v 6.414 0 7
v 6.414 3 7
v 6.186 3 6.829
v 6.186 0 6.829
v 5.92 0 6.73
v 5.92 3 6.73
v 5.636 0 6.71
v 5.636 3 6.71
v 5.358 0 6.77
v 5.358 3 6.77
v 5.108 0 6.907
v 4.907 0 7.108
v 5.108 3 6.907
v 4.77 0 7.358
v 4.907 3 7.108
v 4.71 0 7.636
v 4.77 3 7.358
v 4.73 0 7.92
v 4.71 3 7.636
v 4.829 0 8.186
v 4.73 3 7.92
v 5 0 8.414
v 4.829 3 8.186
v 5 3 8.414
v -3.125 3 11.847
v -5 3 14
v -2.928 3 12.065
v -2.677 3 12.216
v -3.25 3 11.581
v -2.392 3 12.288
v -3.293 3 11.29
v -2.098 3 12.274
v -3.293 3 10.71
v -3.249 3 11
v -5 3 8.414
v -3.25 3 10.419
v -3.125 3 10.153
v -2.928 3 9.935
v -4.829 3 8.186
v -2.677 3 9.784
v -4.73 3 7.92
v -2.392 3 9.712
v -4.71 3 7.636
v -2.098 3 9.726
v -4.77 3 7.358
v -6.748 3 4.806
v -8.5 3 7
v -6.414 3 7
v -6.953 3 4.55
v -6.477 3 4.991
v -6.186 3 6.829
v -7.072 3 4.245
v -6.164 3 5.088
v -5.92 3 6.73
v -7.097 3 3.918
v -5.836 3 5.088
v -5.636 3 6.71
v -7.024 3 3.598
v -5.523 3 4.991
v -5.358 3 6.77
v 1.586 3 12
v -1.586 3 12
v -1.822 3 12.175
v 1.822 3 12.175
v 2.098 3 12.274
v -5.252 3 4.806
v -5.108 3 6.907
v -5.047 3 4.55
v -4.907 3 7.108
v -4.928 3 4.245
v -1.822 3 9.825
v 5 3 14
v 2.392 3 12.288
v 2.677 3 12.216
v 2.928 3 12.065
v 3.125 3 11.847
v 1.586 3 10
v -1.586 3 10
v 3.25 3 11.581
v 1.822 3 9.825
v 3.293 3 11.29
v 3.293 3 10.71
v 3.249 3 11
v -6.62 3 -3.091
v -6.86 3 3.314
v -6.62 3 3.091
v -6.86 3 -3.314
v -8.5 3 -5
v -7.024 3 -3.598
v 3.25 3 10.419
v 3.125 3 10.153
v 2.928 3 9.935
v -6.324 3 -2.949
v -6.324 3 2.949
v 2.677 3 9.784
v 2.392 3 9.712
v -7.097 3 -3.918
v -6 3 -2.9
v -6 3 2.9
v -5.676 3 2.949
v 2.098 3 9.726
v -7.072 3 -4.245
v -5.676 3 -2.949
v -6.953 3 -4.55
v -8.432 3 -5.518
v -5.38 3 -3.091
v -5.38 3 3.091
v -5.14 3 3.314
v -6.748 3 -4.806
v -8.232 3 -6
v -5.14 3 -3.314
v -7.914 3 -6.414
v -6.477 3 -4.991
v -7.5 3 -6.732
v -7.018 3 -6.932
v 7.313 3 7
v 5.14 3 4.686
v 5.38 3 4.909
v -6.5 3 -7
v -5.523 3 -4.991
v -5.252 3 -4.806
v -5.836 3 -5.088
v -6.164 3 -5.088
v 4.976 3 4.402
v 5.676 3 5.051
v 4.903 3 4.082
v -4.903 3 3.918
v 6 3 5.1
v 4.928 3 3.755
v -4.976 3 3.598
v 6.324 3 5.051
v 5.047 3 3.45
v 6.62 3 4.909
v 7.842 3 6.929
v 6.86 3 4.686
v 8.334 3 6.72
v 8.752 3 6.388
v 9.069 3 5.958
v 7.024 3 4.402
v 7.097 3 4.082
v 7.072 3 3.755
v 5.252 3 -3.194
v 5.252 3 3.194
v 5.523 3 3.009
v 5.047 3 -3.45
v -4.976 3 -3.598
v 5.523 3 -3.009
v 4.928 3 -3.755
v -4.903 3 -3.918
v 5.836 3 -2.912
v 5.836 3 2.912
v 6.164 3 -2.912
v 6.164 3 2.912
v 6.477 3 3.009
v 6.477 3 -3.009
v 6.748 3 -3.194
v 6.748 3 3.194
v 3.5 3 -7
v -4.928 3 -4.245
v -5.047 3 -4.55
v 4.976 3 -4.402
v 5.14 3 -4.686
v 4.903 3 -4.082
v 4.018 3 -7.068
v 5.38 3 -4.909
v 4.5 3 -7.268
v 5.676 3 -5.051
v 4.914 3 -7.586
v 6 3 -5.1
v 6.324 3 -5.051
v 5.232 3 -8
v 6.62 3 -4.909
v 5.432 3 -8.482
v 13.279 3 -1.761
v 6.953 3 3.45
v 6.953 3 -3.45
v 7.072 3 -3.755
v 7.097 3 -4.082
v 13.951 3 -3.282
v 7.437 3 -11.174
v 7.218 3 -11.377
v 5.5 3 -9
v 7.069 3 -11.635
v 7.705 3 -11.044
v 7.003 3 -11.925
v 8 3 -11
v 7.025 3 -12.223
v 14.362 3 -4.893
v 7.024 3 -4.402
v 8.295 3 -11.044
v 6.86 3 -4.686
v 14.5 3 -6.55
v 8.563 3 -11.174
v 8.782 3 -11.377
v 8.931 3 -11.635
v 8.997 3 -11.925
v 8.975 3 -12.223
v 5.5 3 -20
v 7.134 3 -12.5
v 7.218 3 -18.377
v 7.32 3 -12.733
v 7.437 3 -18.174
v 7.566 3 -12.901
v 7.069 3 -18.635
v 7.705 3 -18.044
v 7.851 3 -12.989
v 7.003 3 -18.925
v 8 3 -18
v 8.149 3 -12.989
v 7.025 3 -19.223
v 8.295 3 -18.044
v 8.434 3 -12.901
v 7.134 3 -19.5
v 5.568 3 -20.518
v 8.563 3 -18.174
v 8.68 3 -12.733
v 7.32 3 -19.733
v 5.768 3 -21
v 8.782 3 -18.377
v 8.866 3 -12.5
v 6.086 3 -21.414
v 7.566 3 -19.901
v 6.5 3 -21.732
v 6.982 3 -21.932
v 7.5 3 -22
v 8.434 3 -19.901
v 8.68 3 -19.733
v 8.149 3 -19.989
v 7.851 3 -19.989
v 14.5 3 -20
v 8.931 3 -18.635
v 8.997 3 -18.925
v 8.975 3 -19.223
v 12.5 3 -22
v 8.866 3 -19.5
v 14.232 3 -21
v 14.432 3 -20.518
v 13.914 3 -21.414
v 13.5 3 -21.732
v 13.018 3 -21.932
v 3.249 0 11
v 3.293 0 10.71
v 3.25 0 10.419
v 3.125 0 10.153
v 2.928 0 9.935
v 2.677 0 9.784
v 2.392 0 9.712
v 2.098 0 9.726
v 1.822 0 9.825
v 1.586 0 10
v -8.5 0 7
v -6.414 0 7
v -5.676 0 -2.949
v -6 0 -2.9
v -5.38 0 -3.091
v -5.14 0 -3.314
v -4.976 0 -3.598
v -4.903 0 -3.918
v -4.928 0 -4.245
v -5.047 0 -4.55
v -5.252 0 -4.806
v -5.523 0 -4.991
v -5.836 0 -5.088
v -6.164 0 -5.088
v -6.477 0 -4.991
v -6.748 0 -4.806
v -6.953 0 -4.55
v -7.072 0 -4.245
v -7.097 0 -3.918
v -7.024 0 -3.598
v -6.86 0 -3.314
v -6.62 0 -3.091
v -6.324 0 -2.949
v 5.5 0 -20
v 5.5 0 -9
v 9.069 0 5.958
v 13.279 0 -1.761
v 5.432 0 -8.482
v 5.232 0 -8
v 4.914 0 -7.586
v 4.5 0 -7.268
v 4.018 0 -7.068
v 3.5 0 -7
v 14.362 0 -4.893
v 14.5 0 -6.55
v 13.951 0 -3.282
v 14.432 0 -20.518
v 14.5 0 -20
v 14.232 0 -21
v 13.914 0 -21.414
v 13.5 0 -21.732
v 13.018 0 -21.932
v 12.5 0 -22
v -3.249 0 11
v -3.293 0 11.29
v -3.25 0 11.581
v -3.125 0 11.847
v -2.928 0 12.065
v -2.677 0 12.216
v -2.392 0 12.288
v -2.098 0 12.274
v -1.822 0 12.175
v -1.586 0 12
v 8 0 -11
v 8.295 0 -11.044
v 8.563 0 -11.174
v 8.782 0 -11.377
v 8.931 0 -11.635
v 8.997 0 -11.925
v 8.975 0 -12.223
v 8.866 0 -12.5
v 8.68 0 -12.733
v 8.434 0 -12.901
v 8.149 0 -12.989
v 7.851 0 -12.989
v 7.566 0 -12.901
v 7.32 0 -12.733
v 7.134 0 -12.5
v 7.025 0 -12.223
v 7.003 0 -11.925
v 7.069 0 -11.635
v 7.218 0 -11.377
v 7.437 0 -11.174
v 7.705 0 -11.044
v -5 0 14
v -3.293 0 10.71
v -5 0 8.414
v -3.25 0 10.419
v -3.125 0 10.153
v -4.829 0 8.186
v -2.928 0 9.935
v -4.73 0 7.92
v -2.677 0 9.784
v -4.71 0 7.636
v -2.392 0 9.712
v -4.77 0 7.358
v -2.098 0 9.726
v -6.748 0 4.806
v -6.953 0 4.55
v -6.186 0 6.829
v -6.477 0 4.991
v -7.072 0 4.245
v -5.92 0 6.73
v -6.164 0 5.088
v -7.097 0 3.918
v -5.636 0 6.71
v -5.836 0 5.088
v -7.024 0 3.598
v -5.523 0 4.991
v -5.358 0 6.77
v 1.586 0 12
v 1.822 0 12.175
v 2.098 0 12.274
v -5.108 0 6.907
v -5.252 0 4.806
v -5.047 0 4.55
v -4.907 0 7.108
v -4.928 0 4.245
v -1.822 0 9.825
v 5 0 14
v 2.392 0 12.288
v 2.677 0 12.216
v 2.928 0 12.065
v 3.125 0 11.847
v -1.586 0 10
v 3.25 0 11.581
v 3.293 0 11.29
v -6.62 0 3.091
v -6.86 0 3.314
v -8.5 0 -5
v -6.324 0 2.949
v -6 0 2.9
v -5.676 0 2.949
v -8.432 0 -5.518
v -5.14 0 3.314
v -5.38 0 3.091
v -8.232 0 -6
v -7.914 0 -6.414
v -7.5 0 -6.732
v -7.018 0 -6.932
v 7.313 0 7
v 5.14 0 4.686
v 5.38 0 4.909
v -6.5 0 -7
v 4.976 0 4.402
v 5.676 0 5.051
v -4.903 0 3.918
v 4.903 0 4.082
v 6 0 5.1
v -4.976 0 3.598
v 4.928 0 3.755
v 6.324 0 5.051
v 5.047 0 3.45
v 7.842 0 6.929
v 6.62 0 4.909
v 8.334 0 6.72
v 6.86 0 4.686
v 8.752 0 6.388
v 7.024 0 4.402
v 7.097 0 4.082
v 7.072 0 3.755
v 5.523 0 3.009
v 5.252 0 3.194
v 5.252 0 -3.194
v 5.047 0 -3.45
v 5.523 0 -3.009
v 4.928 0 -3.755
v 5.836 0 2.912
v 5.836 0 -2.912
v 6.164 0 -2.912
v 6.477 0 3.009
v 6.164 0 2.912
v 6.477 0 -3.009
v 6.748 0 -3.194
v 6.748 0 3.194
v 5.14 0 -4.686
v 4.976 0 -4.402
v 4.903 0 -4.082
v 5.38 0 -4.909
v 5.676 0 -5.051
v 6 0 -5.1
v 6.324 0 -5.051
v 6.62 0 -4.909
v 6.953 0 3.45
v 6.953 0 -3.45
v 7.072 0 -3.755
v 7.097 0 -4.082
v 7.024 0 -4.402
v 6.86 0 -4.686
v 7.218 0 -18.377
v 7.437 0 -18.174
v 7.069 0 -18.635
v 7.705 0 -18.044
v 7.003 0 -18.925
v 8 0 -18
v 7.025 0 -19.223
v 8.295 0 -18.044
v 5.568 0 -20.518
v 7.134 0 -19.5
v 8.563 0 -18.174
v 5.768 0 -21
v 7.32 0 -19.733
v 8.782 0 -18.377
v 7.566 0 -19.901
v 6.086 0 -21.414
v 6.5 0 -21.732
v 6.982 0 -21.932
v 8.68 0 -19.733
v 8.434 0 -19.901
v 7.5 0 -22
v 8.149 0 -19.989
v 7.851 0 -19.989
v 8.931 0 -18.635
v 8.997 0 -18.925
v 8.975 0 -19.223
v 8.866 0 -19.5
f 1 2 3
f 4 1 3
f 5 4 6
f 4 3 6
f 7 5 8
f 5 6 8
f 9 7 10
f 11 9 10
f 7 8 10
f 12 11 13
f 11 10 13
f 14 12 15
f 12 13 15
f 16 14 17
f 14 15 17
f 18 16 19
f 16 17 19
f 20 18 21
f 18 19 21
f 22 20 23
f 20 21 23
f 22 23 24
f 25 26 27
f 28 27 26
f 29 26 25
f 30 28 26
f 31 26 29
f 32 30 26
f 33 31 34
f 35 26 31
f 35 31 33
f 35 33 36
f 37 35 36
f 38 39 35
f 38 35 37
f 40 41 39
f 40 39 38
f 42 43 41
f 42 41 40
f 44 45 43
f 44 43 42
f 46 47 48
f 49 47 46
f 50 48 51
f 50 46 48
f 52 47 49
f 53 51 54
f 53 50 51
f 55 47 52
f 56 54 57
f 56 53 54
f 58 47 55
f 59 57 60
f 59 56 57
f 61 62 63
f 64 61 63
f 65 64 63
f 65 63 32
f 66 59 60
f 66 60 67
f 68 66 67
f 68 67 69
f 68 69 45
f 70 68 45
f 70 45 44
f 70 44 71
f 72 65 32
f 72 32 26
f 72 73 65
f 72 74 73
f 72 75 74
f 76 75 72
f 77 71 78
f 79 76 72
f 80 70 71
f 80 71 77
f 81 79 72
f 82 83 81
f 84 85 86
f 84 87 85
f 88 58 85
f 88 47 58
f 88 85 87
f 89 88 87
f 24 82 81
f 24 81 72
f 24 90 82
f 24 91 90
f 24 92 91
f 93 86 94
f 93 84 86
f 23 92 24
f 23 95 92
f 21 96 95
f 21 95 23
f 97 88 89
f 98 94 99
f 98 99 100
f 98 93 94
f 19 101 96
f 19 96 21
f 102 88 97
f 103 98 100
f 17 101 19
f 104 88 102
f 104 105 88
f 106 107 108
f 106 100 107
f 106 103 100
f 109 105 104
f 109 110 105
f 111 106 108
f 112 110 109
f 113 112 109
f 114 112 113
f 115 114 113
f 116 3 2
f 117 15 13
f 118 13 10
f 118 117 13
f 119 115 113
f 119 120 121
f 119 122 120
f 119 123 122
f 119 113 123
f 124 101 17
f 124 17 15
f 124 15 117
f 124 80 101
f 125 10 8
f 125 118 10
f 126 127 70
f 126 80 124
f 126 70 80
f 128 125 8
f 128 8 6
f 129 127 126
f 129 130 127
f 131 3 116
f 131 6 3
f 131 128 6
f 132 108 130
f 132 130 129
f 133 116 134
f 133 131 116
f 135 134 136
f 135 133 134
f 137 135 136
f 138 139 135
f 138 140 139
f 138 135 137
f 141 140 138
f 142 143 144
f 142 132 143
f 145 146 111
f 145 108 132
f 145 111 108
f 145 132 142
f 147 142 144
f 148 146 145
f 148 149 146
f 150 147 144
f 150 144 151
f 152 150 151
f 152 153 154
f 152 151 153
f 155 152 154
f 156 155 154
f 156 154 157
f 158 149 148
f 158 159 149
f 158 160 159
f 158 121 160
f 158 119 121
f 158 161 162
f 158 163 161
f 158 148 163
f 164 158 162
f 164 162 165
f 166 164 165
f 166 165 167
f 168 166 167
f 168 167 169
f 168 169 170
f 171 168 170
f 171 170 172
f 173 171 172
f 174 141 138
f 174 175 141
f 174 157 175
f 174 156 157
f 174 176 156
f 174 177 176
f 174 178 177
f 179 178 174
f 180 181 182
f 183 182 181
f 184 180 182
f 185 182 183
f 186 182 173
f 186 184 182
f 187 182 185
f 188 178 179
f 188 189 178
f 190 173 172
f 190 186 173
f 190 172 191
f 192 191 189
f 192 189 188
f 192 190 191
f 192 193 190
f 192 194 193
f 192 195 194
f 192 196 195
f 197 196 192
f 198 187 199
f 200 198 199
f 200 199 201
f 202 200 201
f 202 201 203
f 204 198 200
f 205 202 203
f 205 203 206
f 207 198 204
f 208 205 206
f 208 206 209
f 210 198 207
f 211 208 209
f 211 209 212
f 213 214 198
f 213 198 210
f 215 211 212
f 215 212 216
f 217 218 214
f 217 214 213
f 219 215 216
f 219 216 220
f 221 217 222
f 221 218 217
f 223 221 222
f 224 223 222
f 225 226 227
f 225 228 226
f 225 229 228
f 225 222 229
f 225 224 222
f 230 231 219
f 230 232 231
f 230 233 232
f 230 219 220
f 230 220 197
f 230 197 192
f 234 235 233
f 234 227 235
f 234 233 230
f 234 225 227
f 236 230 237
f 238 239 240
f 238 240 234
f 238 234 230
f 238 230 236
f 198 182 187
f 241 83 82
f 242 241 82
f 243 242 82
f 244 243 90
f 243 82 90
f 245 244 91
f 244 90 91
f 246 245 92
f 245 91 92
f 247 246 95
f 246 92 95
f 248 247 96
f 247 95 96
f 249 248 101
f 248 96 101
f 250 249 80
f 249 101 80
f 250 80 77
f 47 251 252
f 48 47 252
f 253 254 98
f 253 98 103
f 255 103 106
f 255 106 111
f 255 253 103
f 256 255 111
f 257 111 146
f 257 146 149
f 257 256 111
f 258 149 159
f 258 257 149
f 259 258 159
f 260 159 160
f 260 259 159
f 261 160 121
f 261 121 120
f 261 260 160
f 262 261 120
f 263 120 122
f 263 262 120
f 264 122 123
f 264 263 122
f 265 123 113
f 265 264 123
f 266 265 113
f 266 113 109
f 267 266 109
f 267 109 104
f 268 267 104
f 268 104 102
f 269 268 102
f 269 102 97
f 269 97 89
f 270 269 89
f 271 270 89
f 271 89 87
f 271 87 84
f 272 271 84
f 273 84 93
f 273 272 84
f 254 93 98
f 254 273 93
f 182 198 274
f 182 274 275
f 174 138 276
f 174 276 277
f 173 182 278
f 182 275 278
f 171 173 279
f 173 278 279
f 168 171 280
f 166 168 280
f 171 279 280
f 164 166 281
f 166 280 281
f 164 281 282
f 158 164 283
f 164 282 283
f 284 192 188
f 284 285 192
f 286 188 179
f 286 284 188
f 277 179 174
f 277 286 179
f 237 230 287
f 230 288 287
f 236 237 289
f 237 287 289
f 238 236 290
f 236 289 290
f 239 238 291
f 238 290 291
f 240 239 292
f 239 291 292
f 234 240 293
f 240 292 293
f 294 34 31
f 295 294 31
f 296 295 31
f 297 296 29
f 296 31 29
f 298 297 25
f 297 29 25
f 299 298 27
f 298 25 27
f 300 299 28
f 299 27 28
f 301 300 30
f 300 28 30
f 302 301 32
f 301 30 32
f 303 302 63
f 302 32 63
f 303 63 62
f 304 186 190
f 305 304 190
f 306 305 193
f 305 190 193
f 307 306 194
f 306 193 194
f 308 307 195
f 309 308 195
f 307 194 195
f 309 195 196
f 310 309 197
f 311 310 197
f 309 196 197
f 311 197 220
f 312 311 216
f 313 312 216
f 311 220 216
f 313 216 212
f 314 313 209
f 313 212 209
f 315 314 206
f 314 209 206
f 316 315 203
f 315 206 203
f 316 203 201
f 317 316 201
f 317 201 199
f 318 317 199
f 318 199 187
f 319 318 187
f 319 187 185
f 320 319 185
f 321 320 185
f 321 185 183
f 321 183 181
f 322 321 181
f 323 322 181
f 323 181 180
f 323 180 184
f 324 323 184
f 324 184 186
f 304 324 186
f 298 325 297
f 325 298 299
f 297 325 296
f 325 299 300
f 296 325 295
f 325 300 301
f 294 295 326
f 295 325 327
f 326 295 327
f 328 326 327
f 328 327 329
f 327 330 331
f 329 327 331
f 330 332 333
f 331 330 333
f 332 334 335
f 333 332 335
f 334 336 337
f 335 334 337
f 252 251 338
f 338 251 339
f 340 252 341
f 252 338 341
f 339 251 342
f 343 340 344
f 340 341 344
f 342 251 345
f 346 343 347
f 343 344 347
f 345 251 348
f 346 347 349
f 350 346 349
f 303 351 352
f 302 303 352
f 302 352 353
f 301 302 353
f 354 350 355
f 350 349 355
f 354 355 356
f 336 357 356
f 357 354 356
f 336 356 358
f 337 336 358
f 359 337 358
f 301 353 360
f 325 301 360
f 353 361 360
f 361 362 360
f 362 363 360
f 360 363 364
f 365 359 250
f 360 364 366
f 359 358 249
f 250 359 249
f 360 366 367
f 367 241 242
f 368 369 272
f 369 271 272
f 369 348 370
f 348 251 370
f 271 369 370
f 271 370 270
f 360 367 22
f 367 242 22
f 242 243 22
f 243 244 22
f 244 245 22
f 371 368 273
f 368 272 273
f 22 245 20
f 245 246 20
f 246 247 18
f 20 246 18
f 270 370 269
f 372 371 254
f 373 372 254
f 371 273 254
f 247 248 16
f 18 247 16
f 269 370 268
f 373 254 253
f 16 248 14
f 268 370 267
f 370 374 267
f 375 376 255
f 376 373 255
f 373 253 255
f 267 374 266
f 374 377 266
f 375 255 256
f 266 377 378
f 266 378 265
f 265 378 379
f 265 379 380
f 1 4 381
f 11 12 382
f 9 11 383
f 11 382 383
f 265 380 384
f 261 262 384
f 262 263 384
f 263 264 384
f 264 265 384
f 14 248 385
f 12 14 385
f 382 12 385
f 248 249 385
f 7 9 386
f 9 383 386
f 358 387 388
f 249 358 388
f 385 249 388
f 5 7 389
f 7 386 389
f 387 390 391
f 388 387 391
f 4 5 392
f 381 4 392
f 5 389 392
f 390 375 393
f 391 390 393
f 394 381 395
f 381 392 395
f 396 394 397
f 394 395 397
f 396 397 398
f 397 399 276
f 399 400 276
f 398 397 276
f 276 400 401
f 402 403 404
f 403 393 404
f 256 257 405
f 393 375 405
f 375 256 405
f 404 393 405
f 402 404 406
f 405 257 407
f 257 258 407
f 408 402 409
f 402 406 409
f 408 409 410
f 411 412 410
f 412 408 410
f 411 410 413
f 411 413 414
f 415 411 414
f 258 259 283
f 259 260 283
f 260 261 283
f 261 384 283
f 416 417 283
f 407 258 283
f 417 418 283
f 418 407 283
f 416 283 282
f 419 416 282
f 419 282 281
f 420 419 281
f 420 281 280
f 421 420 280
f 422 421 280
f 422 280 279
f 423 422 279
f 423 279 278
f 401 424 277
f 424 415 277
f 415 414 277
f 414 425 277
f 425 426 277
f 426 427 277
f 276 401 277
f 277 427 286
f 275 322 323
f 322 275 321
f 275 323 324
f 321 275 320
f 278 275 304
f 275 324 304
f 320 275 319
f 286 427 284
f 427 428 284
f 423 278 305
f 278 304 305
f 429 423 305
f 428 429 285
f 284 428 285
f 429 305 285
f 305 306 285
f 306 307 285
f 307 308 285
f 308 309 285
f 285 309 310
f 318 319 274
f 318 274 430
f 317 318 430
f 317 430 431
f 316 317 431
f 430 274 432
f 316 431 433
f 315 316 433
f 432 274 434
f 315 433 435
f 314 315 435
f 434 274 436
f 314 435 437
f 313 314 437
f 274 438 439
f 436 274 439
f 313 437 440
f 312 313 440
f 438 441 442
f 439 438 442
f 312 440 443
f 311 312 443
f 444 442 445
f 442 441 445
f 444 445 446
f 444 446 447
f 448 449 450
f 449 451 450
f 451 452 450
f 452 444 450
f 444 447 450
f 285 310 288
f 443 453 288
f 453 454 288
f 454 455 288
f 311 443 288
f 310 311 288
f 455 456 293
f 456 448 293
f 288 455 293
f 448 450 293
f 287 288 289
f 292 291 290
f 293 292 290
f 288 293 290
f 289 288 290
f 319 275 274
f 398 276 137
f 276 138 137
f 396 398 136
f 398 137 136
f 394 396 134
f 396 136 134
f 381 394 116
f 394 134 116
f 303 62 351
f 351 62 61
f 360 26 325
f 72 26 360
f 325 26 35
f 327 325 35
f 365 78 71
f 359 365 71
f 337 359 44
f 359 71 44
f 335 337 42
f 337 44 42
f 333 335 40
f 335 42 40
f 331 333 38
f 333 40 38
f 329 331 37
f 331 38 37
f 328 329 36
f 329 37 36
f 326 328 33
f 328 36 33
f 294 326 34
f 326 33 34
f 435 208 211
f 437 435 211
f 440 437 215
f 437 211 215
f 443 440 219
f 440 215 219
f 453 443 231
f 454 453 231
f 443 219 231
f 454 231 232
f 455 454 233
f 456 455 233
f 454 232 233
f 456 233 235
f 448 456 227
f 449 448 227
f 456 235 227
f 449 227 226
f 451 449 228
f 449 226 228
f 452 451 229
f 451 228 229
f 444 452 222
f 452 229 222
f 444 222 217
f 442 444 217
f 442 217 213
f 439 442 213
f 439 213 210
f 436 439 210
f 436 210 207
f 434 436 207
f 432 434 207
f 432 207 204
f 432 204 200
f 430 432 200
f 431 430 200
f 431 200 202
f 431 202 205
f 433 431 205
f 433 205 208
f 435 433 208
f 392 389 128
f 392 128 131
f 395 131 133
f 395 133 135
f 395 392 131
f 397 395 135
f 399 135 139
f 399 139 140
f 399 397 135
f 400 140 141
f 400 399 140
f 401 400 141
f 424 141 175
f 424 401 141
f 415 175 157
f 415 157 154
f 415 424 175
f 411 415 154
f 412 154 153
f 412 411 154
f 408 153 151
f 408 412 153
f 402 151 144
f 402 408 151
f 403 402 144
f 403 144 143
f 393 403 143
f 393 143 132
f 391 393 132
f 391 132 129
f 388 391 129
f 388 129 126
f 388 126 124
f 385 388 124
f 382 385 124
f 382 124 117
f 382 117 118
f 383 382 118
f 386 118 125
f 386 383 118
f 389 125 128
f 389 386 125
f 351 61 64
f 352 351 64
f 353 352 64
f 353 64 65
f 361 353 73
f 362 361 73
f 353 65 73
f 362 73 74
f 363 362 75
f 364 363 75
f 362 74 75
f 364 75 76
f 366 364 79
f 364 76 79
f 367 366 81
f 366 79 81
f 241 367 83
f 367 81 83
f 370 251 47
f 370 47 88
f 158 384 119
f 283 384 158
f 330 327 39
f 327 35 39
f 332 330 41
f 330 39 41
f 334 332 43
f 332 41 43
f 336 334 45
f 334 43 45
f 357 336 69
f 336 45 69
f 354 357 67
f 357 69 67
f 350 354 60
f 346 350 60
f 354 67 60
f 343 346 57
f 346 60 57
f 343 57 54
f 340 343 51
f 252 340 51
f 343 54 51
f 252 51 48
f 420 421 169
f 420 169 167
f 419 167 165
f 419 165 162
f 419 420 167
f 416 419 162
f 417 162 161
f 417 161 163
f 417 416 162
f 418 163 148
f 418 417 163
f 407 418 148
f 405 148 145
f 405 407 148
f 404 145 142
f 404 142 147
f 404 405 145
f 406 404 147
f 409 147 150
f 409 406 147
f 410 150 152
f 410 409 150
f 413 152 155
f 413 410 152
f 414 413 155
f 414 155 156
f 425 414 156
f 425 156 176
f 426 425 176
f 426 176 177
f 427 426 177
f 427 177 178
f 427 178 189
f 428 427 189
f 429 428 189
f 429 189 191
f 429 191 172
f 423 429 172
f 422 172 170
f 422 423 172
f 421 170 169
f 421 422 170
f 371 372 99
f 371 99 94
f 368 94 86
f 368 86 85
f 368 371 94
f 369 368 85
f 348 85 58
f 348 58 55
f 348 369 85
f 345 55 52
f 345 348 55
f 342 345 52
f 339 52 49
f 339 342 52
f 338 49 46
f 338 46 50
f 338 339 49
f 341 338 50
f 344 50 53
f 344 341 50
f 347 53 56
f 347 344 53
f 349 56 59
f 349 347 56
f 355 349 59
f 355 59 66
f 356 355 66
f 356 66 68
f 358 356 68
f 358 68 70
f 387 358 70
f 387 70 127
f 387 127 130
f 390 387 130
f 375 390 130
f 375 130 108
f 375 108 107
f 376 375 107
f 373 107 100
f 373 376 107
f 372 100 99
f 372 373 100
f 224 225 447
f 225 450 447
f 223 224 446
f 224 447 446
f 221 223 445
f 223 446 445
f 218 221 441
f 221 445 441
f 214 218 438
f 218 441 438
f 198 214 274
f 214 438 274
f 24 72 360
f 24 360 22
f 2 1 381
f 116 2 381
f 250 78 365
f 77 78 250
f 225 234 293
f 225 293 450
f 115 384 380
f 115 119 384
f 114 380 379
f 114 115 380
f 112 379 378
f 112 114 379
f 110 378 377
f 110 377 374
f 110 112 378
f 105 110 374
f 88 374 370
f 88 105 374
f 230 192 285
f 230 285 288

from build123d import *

# Parameters (mm, degrees)
SKETCH_1_W          = 17
SKETCH_1_H          = 14
SKETCH_1_R          = 1.1
EXTRUDE_1_DEPTH     = 3
EXTRUDE_3_DEPTH     = 3
SKETCH_3_R          = 1
CUT_EXTRUDE_1_DEPTH = 27.518861212
SKETCH_4_W          = 10
SKETCH_4_H          = 7
SKETCH_4_W_2        = 6
SKETCH_4_H_2        = 2
EXTRUDE_4_DEPTH     = 3
SKETCH_7_R          = 1
CUT_EXTRUDE_4_DEPTH = 27.518861212
FILLET_1_R          = 10
FILLET_2_R          = 2
CUT_EXTRUDE_5_DEPTH = 27.518861212


with BuildPart() as part:
    # 草图1 → 凸台-拉伸1 (new body)
    with BuildSketch(Plane(origin=(0, 0, 0), x_dir=(1, 0, 0), z_dir=(0, 1, 0))):
        Rectangle(SKETCH_1_W, SKETCH_1_H)
        with Locations(Location((-6, 4, 0), (0, 0, 270))):
            Circle(SKETCH_1_R, mode=Mode.SUBTRACT)
        with Locations(Location((6, 4, 0), (0, 0, 90))):
            Circle(SKETCH_1_R, mode=Mode.SUBTRACT)
        with Locations(Location((6, -4, 0), (0, 0, 270))):
            Circle(SKETCH_1_R, mode=Mode.SUBTRACT)
        with Locations(Location((-6, -4, 0), (0, 0, 90))):
            Circle(SKETCH_1_R, mode=Mode.SUBTRACT)
    extrude(amount=EXTRUDE_1_DEPTH)

    # 草图2 → 凸台-拉伸3 (add)
    with BuildSketch(Plane(origin=(0, 3, 0), x_dir=(1, 0, 0), z_dir=(0, 1, 0))):
        Polygon((5.5, 22), (5.5, 7), (8.5, 7), (8.5, -7), (14.5, 4), (14.5, 22), align=None)
    extrude(amount=-EXTRUDE_3_DEPTH)

    # 草图3 → 切除-拉伸1 (cut, through all)
    with BuildSketch(Plane(origin=(0, 3, 0), x_dir=(1, 0, 0), z_dir=(0, 1, 0))):
        with Locations(Location((8, 19, 0), (0, 0, 270))):
            Circle(SKETCH_3_R)
        with Locations(Location((8, 12, 0), (0, 0, 270))):
            Circle(SKETCH_3_R)
    extrude(amount=-CUT_EXTRUDE_1_DEPTH, mode=Mode.SUBTRACT)

    # 草图4 → 凸台-拉伸4 (add)
    with BuildSketch(Plane(origin=(0, 3, 0), x_dir=(1, 0, 0), z_dir=(0, 1, 0))):
        with Locations((0, -10.5)):
            Rectangle(SKETCH_4_W, SKETCH_4_H)
        with Locations((0, -11)):
            Rectangle(SKETCH_4_W_2, SKETCH_4_H_2, mode=Mode.SUBTRACT)
    extrude(amount=-EXTRUDE_4_DEPTH)

    # 草图7 → 切除-拉伸4 (cut, through all)
    with BuildSketch(Plane(origin=(0, 3, 0), x_dir=(1, 0, 0), z_dir=(0, 1, 0))):
        with Locations((5.707106781, -7.707106781)):
            Circle(SKETCH_7_R)
        with Locations((-5.707106781, -7.707106781)):
            Circle(SKETCH_7_R)
    extrude(amount=-CUT_EXTRUDE_4_DEPTH, mode=Mode.SUBTRACT)

    # 圆角1
    fillet_1_edges = [part.edges().sort_by_distance(p)[0] for p in [
        (14.5, 1.5, -4),
    ]]
    fillet(fillet_1_edges, radius=FILLET_1_R)

    # 圆角2
    fillet_2_edges = [part.edges().sort_by_distance(p)[0] for p in [
        (14.5, 1.5, -22),
        (5.5, 1.5, -22),
        (5.5, 1.5, -7),
        (8.5, 1.5, 7),
        (-8.5, 1.5, -7),
    ]]
    fillet(fillet_2_edges, radius=FILLET_2_R)

    # 草图8 → 切除-拉伸5 (cut, through all)
    with BuildSketch(Plane(origin=(0, 3, 0), x_dir=(1, 0, 0), z_dir=(0, 1, 0))):
        with BuildLine():
            ThreePointArc((-1.336748061, -11), (-2.292893219, -9.707106781), (-3.249038376, -11))
            ThreePointArc((-3.249038376, -11), (-2.292893219, -12.292893219), (-1.336748061, -11))
        make_face()
        with BuildLine():
            ThreePointArc((1.336748061, -11), (2.292893219, -12.292893219), (3.249038376, -11))
            ThreePointArc((3.249038376, -11), (2.292893219, -9.707106781), (1.336748061, -11))
        make_face()
    extrude(amount=-CUT_EXTRUDE_5_DEPTH, mode=Mode.SUBTRACT)


solid = part.part
